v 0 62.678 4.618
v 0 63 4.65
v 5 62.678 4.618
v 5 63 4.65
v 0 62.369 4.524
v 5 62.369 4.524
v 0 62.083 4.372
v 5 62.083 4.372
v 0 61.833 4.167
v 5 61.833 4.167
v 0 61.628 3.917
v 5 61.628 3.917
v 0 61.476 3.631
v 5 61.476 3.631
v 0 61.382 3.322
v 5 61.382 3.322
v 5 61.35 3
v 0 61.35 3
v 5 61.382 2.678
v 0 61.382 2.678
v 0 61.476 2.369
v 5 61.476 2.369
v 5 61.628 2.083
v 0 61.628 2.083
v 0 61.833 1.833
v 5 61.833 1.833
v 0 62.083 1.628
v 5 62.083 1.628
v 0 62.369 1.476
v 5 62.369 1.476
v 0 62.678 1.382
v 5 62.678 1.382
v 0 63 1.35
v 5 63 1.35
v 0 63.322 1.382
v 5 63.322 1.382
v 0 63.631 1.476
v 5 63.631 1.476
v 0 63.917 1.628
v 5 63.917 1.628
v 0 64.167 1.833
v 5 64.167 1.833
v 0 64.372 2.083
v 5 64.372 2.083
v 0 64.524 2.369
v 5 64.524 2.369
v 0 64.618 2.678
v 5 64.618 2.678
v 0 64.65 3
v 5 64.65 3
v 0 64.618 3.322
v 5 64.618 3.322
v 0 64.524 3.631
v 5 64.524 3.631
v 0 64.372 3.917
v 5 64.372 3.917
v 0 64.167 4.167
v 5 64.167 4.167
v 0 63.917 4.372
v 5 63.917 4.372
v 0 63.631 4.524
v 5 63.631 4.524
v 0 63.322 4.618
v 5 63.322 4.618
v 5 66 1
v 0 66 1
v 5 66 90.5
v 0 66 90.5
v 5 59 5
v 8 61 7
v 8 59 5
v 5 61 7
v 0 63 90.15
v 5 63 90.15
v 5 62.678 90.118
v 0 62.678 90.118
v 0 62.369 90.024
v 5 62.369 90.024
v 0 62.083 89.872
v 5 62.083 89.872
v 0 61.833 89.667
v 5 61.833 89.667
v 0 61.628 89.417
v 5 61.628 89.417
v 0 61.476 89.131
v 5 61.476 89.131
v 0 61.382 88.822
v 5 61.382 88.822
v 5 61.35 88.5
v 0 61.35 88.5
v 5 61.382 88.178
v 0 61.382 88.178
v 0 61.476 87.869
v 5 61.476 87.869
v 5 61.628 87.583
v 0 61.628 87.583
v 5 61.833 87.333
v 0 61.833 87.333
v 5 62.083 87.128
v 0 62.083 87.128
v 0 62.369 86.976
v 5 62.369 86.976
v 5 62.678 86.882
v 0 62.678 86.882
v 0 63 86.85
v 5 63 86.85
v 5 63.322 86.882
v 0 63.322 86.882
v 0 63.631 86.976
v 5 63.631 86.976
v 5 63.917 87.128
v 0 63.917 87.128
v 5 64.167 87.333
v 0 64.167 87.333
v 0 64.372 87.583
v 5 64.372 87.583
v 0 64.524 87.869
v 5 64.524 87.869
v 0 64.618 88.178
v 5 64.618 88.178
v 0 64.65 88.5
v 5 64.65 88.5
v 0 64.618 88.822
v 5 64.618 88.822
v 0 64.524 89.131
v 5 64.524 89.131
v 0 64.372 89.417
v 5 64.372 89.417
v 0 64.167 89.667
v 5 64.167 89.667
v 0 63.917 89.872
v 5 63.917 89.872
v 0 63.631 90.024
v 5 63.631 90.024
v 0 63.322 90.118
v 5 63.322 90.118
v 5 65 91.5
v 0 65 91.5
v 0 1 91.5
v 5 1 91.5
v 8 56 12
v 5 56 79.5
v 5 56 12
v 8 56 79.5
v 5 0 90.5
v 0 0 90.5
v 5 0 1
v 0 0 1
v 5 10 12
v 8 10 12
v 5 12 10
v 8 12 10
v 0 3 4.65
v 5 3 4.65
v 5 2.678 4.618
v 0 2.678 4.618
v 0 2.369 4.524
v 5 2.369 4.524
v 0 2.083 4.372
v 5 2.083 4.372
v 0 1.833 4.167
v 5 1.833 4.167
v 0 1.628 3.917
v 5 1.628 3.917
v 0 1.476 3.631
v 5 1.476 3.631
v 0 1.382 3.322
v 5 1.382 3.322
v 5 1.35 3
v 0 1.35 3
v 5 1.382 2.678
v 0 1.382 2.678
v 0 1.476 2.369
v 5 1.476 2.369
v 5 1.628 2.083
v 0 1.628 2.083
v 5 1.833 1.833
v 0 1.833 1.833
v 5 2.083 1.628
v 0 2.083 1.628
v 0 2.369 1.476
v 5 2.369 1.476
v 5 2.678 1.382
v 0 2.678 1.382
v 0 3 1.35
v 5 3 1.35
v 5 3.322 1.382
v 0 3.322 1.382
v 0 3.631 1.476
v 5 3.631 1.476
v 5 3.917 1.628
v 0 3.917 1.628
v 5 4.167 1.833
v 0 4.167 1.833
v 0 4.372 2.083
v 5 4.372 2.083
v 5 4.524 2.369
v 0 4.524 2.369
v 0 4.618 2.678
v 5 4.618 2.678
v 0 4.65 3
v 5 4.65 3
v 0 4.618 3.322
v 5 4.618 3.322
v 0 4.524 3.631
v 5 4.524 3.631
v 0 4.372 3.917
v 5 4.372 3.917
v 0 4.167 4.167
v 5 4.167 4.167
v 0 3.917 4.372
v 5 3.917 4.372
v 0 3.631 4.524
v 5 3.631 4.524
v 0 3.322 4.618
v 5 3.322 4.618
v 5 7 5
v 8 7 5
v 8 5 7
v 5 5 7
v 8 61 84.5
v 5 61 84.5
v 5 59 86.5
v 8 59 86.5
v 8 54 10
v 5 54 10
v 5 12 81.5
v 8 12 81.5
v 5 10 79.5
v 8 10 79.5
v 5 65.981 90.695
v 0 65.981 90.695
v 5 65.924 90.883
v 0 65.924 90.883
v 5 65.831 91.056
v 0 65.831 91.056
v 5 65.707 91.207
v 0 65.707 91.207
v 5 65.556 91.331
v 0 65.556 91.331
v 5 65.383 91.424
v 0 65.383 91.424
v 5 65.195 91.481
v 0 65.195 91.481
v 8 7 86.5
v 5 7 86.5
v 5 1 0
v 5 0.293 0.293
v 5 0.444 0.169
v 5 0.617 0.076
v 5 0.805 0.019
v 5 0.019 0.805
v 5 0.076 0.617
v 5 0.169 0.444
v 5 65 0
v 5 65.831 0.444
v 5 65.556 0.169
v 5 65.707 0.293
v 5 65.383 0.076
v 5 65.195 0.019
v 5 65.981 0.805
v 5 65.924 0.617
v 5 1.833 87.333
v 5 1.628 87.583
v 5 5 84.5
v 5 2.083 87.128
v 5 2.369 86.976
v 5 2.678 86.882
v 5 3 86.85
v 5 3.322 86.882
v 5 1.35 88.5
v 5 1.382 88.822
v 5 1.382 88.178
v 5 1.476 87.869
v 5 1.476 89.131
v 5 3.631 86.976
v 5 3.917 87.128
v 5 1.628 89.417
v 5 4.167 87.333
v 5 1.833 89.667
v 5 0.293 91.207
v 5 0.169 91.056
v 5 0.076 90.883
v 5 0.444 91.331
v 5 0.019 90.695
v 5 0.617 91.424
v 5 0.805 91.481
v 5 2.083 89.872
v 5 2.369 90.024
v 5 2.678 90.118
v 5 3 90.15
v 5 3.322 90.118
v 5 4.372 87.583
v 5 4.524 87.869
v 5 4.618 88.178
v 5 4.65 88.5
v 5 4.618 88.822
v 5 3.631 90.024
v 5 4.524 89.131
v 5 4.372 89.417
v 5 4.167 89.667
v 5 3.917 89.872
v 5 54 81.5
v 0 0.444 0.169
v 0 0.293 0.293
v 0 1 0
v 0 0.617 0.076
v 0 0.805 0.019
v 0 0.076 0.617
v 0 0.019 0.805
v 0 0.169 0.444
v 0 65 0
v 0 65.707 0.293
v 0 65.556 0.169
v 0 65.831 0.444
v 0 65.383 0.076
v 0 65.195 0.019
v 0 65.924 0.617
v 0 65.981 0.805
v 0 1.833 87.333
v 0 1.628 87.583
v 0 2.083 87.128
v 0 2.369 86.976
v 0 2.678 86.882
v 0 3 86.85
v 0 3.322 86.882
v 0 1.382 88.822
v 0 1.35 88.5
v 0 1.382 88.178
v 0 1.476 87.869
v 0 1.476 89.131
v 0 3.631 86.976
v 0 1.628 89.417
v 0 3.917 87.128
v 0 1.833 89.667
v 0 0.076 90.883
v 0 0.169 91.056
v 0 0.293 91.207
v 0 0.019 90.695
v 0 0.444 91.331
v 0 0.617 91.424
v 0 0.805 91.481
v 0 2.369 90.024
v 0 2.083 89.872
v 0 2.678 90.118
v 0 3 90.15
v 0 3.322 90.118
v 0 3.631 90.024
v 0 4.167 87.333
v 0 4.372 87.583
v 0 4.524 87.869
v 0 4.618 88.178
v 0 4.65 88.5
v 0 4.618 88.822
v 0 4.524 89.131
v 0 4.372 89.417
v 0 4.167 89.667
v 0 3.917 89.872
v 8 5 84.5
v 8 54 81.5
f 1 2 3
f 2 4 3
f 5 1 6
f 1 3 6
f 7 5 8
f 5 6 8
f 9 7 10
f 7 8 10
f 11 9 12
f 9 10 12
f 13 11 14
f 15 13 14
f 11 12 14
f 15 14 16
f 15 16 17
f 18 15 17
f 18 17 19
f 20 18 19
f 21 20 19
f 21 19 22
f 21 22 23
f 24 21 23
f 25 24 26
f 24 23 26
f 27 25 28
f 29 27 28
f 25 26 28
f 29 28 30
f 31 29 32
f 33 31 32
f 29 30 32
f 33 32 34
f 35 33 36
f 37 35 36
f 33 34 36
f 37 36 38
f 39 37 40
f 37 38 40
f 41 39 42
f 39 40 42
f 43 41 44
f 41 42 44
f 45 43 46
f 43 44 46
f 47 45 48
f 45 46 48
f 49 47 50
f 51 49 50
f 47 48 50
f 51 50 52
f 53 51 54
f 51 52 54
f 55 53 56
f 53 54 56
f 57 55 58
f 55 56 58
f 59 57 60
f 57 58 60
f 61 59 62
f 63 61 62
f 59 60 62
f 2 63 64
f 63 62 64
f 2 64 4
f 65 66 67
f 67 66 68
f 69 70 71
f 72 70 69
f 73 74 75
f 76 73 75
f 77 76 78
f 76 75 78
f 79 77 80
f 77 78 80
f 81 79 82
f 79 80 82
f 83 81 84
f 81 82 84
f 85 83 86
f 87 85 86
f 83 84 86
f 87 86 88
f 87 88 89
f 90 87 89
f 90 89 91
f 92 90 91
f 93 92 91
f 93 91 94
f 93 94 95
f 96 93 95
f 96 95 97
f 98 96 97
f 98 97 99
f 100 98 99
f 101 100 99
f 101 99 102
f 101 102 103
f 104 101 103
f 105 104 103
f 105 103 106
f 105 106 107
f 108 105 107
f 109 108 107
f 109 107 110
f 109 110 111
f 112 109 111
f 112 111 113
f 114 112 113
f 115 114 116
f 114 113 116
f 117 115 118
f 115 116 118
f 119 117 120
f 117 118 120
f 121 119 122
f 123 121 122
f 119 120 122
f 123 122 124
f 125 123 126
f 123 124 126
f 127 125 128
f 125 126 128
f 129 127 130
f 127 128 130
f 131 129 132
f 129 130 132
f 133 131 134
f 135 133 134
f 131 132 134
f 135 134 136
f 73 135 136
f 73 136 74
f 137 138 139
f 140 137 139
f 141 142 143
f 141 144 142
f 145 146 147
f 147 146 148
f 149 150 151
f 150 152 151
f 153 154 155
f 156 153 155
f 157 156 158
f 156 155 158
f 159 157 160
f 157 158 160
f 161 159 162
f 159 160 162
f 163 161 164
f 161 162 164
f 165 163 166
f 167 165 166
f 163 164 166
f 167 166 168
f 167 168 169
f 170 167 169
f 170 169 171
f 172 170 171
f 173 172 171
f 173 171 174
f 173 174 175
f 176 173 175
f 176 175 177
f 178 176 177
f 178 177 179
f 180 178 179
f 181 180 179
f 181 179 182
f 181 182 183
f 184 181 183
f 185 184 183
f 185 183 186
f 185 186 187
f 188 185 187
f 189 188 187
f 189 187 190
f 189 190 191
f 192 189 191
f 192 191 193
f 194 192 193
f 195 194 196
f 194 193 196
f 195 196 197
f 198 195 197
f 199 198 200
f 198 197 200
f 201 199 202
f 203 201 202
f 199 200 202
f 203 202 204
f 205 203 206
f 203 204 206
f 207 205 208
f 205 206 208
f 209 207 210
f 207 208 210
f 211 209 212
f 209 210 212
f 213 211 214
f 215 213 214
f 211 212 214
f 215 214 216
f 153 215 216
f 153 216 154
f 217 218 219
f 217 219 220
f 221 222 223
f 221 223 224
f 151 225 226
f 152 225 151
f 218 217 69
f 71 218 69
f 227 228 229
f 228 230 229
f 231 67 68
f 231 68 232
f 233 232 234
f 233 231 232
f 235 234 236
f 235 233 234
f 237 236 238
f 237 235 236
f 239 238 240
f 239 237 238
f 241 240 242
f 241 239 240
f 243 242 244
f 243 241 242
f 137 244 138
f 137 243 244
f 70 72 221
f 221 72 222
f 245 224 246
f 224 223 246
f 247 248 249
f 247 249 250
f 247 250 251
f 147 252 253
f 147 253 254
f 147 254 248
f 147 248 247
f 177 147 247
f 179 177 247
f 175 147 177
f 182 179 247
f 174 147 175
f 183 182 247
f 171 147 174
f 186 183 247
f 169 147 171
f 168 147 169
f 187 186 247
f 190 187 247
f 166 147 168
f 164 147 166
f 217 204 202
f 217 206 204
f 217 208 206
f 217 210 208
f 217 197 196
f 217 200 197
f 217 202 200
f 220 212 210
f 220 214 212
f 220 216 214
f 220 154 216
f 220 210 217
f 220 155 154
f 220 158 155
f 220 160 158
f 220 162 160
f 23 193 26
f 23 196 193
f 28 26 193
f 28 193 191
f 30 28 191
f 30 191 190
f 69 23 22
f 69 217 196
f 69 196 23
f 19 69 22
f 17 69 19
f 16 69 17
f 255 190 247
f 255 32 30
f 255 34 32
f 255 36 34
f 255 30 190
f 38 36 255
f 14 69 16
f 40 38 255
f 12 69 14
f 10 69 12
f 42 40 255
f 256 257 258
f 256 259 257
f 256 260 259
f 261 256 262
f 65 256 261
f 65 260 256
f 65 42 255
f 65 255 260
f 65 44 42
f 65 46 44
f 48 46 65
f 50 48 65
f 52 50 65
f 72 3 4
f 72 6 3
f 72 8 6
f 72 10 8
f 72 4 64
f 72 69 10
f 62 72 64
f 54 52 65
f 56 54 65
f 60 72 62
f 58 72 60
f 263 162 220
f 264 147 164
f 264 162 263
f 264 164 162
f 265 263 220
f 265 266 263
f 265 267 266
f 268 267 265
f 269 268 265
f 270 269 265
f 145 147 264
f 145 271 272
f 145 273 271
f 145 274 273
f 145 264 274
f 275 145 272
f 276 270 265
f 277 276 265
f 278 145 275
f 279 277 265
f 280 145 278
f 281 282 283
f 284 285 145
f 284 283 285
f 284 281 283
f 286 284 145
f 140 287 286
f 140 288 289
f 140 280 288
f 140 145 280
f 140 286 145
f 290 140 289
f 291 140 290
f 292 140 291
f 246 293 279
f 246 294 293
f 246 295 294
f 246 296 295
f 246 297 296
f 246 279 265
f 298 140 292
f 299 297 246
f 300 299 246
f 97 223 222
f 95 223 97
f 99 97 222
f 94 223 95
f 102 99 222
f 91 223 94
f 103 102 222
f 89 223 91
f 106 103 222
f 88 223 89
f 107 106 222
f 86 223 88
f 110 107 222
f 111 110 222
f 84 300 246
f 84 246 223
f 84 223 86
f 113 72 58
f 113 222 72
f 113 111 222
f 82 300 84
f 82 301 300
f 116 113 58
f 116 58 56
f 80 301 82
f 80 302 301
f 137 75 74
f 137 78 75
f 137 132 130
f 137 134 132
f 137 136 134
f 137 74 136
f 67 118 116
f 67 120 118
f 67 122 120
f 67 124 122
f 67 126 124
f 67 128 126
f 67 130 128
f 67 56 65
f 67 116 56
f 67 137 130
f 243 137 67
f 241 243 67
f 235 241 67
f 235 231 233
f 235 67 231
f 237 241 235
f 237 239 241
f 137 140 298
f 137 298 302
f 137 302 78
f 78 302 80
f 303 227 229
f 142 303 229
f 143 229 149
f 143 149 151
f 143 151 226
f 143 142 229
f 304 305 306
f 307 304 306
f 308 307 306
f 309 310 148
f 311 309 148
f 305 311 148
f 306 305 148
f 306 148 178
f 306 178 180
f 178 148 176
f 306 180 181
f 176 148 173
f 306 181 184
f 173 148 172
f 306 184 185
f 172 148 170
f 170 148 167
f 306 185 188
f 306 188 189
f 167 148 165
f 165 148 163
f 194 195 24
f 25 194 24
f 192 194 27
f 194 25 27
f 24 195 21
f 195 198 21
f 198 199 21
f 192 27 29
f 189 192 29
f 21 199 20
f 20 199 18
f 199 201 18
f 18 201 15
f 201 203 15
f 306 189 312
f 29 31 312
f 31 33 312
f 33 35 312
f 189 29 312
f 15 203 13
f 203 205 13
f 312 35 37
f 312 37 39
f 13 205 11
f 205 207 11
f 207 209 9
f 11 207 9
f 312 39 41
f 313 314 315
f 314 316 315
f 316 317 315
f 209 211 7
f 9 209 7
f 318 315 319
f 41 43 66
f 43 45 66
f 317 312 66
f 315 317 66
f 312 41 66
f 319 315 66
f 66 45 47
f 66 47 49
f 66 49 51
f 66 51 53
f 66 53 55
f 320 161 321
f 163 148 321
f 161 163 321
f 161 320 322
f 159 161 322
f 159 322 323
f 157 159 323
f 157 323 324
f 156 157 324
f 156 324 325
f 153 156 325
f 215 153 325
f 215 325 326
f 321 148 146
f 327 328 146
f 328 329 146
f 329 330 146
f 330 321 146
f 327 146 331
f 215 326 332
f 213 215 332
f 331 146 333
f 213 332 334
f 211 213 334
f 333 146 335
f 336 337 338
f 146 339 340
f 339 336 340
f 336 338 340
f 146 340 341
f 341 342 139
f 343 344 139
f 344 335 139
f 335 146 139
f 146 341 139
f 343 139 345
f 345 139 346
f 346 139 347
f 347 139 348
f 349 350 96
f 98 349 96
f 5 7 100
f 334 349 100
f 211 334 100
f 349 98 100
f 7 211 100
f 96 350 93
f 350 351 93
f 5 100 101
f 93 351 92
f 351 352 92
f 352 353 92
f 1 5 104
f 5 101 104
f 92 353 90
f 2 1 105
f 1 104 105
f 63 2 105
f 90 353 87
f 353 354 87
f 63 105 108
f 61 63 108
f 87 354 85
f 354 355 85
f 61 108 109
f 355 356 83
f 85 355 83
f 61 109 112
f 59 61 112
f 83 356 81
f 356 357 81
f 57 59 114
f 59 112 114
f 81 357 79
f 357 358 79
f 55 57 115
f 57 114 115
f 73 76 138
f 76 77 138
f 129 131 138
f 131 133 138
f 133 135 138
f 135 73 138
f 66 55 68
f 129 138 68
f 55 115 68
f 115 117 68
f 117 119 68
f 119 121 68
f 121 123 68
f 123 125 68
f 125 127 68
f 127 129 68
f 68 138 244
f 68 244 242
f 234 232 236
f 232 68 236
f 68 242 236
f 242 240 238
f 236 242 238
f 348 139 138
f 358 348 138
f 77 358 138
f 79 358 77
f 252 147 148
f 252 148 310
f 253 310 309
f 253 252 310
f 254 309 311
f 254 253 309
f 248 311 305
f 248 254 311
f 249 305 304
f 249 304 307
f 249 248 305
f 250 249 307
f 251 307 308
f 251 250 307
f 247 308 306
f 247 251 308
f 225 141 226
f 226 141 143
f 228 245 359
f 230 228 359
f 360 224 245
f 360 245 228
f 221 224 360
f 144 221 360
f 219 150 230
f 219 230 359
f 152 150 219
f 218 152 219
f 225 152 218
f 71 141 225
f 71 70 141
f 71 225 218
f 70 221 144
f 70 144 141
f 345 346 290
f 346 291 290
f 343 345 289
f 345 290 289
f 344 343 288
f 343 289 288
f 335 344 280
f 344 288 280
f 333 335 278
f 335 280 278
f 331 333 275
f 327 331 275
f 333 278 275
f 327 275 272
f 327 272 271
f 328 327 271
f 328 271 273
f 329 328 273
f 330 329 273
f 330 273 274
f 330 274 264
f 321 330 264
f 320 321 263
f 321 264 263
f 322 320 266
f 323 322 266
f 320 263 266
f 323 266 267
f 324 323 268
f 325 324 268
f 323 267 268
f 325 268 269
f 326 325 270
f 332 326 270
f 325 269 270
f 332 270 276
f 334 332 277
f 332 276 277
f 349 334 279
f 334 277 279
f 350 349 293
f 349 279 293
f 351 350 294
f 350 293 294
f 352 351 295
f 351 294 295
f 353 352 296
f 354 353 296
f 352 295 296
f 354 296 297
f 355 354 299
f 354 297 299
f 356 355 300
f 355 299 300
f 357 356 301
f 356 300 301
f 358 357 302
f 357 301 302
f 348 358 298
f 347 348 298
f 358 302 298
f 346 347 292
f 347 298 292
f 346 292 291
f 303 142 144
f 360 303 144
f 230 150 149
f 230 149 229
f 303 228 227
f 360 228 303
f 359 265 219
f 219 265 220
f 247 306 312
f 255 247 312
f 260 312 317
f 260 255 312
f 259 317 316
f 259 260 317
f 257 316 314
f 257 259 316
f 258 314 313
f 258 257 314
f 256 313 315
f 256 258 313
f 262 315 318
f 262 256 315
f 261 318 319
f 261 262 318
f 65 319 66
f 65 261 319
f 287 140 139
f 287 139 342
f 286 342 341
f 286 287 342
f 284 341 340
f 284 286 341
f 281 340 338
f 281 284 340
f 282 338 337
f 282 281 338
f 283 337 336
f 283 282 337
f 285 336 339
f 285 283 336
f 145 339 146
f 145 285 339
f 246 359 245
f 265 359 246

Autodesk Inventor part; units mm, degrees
ref_plane "YZ Plane" through (0, 0, 0) normal (1, 0, 0) x (0, 1, 0)
ref_plane "XZ Plane" through (0, 0, 0) normal (0, 1, 0) x (-1, 0, 0)
ref_plane "XY Plane" through (0, 0, 0) normal (0, 0, 1) x (1, 0, 0)
sketch "Sketch1" plane through (0, 0, 0) normal (1, 0, 0) x (0, 1, 0)
  line L0 (0, 0) -> (66, 0)
  line L1 (66, 0) -> (66, 91.5)
  line L2 (66, 91.5) -> (0, 91.5)
  line L3 (0, 91.5) -> (0, 0)
  dimension "d0" = 91.5
  dimension "d1" = 66
extrude "Extrusion1" add sketch "Sketch1" along normal blind 5
fillet "Fillet1" radius 1 4 edges at (2.5, 0, 91.5) (2.5, 0, 0) (2.5, 66, 0) (2.5, 66, 91.5)
sketch "Sketch2" plane through (5, 0, 0) normal (1, 0, 0) x (0, 0, -1)
  line L0 (-86.5, 5) -> (-5, 5)
  line L1 (-5, 5) -> (-5, 61)
  line L2 (-5, 61) -> (-86.5, 61)
  line L3 (-86.5, 61) -> (-86.5, 5)
  line L4 (-90.5, 0) -> (-1, 0) projected
  line L5 (0, 1) -> (0, 65) projected
  line L6 (-1, 66) -> (-90.5, 66) projected
  line L7 (-91.5, 65) -> (-91.5, 1) projected
  point P0 (0, 0)
  dimension "d5" = 5
  dimension "d6" = 5
  dimension "d7" = 5
  dimension "d8" = 5
extrude "Extrusion2" add sketch "Sketch2" along normal blind 3
chamfer "Chamfer1" distance 2 angle 45 4 edges at (6.5, 61, 86.5) (6.5, 5, 86.5) (6.5, 5, 5) (6.5, 61, 5)
sketch "Sketch3" plane through (8, 0, 0) normal (1, 0, 0) x (0, 0, -1)
  line L0 (-81.5, 56) -> (-10, 56)
  line L1 (-10, 56) -> (-10, 10)
  line L2 (-10, 10) -> (-81.5, 10)
  line L3 (-81.5, 10) -> (-81.5, 56)
  line L4 (-5, 7) -> (-5, 59) projected
  line L5 (-7, 61) -> (-84.5, 61) projected
  line L6 (-86.5, 59) -> (-86.5, 7) projected
  line L7 (-84.5, 5) -> (-7, 5) projected
  point P0 (0, 0)
  dimension "d14" = 5
  dimension "d15" = 5
  dimension "d17" = 5
  dimension "d18" = 5
extrude "Extrusion3" cut sketch "Sketch3" against normal blind 3
chamfer "Chamfer2" distance 2 angle 45 4 edges at (6.5, 56, 81.5) (6.5, 56, 10) (6.5, 10, 81.5) (6.5, 10, 10)
sketch "Sketch4" plane through (0, 0, 0) normal (-1, 0, 0) x (0, 0, 1)
  line L0 (3, 3) -> (88.5, 3)
  line L1 (88.5, 3) -> (88.5, 63)
  line L2 (88.5, 63) -> (3, 63)
  line L3 (3, 63) -> (3, 3)
  line L4 (90.5, 0) -> (1, 0) projected
  line L5 (91.5, 65) -> (91.5, 1) projected
  line L6 (1, 66) -> (90.5, 66) projected
  line L7 (0, 1) -> (0, 65) projected
  point P0 (0, 0)
  dimension "d24" = 3
  dimension "d25" = 3
  dimension "d26" = 3
  dimension "d27" = 3
hole "Hole1" at (0, 63, 88.5) at (0, 3, 88.5) at (0, 3, 3) at (0, 63, 3) direction (1, 0, 0) diameter 3.3 end through all
properties part number "couverclePCB"
